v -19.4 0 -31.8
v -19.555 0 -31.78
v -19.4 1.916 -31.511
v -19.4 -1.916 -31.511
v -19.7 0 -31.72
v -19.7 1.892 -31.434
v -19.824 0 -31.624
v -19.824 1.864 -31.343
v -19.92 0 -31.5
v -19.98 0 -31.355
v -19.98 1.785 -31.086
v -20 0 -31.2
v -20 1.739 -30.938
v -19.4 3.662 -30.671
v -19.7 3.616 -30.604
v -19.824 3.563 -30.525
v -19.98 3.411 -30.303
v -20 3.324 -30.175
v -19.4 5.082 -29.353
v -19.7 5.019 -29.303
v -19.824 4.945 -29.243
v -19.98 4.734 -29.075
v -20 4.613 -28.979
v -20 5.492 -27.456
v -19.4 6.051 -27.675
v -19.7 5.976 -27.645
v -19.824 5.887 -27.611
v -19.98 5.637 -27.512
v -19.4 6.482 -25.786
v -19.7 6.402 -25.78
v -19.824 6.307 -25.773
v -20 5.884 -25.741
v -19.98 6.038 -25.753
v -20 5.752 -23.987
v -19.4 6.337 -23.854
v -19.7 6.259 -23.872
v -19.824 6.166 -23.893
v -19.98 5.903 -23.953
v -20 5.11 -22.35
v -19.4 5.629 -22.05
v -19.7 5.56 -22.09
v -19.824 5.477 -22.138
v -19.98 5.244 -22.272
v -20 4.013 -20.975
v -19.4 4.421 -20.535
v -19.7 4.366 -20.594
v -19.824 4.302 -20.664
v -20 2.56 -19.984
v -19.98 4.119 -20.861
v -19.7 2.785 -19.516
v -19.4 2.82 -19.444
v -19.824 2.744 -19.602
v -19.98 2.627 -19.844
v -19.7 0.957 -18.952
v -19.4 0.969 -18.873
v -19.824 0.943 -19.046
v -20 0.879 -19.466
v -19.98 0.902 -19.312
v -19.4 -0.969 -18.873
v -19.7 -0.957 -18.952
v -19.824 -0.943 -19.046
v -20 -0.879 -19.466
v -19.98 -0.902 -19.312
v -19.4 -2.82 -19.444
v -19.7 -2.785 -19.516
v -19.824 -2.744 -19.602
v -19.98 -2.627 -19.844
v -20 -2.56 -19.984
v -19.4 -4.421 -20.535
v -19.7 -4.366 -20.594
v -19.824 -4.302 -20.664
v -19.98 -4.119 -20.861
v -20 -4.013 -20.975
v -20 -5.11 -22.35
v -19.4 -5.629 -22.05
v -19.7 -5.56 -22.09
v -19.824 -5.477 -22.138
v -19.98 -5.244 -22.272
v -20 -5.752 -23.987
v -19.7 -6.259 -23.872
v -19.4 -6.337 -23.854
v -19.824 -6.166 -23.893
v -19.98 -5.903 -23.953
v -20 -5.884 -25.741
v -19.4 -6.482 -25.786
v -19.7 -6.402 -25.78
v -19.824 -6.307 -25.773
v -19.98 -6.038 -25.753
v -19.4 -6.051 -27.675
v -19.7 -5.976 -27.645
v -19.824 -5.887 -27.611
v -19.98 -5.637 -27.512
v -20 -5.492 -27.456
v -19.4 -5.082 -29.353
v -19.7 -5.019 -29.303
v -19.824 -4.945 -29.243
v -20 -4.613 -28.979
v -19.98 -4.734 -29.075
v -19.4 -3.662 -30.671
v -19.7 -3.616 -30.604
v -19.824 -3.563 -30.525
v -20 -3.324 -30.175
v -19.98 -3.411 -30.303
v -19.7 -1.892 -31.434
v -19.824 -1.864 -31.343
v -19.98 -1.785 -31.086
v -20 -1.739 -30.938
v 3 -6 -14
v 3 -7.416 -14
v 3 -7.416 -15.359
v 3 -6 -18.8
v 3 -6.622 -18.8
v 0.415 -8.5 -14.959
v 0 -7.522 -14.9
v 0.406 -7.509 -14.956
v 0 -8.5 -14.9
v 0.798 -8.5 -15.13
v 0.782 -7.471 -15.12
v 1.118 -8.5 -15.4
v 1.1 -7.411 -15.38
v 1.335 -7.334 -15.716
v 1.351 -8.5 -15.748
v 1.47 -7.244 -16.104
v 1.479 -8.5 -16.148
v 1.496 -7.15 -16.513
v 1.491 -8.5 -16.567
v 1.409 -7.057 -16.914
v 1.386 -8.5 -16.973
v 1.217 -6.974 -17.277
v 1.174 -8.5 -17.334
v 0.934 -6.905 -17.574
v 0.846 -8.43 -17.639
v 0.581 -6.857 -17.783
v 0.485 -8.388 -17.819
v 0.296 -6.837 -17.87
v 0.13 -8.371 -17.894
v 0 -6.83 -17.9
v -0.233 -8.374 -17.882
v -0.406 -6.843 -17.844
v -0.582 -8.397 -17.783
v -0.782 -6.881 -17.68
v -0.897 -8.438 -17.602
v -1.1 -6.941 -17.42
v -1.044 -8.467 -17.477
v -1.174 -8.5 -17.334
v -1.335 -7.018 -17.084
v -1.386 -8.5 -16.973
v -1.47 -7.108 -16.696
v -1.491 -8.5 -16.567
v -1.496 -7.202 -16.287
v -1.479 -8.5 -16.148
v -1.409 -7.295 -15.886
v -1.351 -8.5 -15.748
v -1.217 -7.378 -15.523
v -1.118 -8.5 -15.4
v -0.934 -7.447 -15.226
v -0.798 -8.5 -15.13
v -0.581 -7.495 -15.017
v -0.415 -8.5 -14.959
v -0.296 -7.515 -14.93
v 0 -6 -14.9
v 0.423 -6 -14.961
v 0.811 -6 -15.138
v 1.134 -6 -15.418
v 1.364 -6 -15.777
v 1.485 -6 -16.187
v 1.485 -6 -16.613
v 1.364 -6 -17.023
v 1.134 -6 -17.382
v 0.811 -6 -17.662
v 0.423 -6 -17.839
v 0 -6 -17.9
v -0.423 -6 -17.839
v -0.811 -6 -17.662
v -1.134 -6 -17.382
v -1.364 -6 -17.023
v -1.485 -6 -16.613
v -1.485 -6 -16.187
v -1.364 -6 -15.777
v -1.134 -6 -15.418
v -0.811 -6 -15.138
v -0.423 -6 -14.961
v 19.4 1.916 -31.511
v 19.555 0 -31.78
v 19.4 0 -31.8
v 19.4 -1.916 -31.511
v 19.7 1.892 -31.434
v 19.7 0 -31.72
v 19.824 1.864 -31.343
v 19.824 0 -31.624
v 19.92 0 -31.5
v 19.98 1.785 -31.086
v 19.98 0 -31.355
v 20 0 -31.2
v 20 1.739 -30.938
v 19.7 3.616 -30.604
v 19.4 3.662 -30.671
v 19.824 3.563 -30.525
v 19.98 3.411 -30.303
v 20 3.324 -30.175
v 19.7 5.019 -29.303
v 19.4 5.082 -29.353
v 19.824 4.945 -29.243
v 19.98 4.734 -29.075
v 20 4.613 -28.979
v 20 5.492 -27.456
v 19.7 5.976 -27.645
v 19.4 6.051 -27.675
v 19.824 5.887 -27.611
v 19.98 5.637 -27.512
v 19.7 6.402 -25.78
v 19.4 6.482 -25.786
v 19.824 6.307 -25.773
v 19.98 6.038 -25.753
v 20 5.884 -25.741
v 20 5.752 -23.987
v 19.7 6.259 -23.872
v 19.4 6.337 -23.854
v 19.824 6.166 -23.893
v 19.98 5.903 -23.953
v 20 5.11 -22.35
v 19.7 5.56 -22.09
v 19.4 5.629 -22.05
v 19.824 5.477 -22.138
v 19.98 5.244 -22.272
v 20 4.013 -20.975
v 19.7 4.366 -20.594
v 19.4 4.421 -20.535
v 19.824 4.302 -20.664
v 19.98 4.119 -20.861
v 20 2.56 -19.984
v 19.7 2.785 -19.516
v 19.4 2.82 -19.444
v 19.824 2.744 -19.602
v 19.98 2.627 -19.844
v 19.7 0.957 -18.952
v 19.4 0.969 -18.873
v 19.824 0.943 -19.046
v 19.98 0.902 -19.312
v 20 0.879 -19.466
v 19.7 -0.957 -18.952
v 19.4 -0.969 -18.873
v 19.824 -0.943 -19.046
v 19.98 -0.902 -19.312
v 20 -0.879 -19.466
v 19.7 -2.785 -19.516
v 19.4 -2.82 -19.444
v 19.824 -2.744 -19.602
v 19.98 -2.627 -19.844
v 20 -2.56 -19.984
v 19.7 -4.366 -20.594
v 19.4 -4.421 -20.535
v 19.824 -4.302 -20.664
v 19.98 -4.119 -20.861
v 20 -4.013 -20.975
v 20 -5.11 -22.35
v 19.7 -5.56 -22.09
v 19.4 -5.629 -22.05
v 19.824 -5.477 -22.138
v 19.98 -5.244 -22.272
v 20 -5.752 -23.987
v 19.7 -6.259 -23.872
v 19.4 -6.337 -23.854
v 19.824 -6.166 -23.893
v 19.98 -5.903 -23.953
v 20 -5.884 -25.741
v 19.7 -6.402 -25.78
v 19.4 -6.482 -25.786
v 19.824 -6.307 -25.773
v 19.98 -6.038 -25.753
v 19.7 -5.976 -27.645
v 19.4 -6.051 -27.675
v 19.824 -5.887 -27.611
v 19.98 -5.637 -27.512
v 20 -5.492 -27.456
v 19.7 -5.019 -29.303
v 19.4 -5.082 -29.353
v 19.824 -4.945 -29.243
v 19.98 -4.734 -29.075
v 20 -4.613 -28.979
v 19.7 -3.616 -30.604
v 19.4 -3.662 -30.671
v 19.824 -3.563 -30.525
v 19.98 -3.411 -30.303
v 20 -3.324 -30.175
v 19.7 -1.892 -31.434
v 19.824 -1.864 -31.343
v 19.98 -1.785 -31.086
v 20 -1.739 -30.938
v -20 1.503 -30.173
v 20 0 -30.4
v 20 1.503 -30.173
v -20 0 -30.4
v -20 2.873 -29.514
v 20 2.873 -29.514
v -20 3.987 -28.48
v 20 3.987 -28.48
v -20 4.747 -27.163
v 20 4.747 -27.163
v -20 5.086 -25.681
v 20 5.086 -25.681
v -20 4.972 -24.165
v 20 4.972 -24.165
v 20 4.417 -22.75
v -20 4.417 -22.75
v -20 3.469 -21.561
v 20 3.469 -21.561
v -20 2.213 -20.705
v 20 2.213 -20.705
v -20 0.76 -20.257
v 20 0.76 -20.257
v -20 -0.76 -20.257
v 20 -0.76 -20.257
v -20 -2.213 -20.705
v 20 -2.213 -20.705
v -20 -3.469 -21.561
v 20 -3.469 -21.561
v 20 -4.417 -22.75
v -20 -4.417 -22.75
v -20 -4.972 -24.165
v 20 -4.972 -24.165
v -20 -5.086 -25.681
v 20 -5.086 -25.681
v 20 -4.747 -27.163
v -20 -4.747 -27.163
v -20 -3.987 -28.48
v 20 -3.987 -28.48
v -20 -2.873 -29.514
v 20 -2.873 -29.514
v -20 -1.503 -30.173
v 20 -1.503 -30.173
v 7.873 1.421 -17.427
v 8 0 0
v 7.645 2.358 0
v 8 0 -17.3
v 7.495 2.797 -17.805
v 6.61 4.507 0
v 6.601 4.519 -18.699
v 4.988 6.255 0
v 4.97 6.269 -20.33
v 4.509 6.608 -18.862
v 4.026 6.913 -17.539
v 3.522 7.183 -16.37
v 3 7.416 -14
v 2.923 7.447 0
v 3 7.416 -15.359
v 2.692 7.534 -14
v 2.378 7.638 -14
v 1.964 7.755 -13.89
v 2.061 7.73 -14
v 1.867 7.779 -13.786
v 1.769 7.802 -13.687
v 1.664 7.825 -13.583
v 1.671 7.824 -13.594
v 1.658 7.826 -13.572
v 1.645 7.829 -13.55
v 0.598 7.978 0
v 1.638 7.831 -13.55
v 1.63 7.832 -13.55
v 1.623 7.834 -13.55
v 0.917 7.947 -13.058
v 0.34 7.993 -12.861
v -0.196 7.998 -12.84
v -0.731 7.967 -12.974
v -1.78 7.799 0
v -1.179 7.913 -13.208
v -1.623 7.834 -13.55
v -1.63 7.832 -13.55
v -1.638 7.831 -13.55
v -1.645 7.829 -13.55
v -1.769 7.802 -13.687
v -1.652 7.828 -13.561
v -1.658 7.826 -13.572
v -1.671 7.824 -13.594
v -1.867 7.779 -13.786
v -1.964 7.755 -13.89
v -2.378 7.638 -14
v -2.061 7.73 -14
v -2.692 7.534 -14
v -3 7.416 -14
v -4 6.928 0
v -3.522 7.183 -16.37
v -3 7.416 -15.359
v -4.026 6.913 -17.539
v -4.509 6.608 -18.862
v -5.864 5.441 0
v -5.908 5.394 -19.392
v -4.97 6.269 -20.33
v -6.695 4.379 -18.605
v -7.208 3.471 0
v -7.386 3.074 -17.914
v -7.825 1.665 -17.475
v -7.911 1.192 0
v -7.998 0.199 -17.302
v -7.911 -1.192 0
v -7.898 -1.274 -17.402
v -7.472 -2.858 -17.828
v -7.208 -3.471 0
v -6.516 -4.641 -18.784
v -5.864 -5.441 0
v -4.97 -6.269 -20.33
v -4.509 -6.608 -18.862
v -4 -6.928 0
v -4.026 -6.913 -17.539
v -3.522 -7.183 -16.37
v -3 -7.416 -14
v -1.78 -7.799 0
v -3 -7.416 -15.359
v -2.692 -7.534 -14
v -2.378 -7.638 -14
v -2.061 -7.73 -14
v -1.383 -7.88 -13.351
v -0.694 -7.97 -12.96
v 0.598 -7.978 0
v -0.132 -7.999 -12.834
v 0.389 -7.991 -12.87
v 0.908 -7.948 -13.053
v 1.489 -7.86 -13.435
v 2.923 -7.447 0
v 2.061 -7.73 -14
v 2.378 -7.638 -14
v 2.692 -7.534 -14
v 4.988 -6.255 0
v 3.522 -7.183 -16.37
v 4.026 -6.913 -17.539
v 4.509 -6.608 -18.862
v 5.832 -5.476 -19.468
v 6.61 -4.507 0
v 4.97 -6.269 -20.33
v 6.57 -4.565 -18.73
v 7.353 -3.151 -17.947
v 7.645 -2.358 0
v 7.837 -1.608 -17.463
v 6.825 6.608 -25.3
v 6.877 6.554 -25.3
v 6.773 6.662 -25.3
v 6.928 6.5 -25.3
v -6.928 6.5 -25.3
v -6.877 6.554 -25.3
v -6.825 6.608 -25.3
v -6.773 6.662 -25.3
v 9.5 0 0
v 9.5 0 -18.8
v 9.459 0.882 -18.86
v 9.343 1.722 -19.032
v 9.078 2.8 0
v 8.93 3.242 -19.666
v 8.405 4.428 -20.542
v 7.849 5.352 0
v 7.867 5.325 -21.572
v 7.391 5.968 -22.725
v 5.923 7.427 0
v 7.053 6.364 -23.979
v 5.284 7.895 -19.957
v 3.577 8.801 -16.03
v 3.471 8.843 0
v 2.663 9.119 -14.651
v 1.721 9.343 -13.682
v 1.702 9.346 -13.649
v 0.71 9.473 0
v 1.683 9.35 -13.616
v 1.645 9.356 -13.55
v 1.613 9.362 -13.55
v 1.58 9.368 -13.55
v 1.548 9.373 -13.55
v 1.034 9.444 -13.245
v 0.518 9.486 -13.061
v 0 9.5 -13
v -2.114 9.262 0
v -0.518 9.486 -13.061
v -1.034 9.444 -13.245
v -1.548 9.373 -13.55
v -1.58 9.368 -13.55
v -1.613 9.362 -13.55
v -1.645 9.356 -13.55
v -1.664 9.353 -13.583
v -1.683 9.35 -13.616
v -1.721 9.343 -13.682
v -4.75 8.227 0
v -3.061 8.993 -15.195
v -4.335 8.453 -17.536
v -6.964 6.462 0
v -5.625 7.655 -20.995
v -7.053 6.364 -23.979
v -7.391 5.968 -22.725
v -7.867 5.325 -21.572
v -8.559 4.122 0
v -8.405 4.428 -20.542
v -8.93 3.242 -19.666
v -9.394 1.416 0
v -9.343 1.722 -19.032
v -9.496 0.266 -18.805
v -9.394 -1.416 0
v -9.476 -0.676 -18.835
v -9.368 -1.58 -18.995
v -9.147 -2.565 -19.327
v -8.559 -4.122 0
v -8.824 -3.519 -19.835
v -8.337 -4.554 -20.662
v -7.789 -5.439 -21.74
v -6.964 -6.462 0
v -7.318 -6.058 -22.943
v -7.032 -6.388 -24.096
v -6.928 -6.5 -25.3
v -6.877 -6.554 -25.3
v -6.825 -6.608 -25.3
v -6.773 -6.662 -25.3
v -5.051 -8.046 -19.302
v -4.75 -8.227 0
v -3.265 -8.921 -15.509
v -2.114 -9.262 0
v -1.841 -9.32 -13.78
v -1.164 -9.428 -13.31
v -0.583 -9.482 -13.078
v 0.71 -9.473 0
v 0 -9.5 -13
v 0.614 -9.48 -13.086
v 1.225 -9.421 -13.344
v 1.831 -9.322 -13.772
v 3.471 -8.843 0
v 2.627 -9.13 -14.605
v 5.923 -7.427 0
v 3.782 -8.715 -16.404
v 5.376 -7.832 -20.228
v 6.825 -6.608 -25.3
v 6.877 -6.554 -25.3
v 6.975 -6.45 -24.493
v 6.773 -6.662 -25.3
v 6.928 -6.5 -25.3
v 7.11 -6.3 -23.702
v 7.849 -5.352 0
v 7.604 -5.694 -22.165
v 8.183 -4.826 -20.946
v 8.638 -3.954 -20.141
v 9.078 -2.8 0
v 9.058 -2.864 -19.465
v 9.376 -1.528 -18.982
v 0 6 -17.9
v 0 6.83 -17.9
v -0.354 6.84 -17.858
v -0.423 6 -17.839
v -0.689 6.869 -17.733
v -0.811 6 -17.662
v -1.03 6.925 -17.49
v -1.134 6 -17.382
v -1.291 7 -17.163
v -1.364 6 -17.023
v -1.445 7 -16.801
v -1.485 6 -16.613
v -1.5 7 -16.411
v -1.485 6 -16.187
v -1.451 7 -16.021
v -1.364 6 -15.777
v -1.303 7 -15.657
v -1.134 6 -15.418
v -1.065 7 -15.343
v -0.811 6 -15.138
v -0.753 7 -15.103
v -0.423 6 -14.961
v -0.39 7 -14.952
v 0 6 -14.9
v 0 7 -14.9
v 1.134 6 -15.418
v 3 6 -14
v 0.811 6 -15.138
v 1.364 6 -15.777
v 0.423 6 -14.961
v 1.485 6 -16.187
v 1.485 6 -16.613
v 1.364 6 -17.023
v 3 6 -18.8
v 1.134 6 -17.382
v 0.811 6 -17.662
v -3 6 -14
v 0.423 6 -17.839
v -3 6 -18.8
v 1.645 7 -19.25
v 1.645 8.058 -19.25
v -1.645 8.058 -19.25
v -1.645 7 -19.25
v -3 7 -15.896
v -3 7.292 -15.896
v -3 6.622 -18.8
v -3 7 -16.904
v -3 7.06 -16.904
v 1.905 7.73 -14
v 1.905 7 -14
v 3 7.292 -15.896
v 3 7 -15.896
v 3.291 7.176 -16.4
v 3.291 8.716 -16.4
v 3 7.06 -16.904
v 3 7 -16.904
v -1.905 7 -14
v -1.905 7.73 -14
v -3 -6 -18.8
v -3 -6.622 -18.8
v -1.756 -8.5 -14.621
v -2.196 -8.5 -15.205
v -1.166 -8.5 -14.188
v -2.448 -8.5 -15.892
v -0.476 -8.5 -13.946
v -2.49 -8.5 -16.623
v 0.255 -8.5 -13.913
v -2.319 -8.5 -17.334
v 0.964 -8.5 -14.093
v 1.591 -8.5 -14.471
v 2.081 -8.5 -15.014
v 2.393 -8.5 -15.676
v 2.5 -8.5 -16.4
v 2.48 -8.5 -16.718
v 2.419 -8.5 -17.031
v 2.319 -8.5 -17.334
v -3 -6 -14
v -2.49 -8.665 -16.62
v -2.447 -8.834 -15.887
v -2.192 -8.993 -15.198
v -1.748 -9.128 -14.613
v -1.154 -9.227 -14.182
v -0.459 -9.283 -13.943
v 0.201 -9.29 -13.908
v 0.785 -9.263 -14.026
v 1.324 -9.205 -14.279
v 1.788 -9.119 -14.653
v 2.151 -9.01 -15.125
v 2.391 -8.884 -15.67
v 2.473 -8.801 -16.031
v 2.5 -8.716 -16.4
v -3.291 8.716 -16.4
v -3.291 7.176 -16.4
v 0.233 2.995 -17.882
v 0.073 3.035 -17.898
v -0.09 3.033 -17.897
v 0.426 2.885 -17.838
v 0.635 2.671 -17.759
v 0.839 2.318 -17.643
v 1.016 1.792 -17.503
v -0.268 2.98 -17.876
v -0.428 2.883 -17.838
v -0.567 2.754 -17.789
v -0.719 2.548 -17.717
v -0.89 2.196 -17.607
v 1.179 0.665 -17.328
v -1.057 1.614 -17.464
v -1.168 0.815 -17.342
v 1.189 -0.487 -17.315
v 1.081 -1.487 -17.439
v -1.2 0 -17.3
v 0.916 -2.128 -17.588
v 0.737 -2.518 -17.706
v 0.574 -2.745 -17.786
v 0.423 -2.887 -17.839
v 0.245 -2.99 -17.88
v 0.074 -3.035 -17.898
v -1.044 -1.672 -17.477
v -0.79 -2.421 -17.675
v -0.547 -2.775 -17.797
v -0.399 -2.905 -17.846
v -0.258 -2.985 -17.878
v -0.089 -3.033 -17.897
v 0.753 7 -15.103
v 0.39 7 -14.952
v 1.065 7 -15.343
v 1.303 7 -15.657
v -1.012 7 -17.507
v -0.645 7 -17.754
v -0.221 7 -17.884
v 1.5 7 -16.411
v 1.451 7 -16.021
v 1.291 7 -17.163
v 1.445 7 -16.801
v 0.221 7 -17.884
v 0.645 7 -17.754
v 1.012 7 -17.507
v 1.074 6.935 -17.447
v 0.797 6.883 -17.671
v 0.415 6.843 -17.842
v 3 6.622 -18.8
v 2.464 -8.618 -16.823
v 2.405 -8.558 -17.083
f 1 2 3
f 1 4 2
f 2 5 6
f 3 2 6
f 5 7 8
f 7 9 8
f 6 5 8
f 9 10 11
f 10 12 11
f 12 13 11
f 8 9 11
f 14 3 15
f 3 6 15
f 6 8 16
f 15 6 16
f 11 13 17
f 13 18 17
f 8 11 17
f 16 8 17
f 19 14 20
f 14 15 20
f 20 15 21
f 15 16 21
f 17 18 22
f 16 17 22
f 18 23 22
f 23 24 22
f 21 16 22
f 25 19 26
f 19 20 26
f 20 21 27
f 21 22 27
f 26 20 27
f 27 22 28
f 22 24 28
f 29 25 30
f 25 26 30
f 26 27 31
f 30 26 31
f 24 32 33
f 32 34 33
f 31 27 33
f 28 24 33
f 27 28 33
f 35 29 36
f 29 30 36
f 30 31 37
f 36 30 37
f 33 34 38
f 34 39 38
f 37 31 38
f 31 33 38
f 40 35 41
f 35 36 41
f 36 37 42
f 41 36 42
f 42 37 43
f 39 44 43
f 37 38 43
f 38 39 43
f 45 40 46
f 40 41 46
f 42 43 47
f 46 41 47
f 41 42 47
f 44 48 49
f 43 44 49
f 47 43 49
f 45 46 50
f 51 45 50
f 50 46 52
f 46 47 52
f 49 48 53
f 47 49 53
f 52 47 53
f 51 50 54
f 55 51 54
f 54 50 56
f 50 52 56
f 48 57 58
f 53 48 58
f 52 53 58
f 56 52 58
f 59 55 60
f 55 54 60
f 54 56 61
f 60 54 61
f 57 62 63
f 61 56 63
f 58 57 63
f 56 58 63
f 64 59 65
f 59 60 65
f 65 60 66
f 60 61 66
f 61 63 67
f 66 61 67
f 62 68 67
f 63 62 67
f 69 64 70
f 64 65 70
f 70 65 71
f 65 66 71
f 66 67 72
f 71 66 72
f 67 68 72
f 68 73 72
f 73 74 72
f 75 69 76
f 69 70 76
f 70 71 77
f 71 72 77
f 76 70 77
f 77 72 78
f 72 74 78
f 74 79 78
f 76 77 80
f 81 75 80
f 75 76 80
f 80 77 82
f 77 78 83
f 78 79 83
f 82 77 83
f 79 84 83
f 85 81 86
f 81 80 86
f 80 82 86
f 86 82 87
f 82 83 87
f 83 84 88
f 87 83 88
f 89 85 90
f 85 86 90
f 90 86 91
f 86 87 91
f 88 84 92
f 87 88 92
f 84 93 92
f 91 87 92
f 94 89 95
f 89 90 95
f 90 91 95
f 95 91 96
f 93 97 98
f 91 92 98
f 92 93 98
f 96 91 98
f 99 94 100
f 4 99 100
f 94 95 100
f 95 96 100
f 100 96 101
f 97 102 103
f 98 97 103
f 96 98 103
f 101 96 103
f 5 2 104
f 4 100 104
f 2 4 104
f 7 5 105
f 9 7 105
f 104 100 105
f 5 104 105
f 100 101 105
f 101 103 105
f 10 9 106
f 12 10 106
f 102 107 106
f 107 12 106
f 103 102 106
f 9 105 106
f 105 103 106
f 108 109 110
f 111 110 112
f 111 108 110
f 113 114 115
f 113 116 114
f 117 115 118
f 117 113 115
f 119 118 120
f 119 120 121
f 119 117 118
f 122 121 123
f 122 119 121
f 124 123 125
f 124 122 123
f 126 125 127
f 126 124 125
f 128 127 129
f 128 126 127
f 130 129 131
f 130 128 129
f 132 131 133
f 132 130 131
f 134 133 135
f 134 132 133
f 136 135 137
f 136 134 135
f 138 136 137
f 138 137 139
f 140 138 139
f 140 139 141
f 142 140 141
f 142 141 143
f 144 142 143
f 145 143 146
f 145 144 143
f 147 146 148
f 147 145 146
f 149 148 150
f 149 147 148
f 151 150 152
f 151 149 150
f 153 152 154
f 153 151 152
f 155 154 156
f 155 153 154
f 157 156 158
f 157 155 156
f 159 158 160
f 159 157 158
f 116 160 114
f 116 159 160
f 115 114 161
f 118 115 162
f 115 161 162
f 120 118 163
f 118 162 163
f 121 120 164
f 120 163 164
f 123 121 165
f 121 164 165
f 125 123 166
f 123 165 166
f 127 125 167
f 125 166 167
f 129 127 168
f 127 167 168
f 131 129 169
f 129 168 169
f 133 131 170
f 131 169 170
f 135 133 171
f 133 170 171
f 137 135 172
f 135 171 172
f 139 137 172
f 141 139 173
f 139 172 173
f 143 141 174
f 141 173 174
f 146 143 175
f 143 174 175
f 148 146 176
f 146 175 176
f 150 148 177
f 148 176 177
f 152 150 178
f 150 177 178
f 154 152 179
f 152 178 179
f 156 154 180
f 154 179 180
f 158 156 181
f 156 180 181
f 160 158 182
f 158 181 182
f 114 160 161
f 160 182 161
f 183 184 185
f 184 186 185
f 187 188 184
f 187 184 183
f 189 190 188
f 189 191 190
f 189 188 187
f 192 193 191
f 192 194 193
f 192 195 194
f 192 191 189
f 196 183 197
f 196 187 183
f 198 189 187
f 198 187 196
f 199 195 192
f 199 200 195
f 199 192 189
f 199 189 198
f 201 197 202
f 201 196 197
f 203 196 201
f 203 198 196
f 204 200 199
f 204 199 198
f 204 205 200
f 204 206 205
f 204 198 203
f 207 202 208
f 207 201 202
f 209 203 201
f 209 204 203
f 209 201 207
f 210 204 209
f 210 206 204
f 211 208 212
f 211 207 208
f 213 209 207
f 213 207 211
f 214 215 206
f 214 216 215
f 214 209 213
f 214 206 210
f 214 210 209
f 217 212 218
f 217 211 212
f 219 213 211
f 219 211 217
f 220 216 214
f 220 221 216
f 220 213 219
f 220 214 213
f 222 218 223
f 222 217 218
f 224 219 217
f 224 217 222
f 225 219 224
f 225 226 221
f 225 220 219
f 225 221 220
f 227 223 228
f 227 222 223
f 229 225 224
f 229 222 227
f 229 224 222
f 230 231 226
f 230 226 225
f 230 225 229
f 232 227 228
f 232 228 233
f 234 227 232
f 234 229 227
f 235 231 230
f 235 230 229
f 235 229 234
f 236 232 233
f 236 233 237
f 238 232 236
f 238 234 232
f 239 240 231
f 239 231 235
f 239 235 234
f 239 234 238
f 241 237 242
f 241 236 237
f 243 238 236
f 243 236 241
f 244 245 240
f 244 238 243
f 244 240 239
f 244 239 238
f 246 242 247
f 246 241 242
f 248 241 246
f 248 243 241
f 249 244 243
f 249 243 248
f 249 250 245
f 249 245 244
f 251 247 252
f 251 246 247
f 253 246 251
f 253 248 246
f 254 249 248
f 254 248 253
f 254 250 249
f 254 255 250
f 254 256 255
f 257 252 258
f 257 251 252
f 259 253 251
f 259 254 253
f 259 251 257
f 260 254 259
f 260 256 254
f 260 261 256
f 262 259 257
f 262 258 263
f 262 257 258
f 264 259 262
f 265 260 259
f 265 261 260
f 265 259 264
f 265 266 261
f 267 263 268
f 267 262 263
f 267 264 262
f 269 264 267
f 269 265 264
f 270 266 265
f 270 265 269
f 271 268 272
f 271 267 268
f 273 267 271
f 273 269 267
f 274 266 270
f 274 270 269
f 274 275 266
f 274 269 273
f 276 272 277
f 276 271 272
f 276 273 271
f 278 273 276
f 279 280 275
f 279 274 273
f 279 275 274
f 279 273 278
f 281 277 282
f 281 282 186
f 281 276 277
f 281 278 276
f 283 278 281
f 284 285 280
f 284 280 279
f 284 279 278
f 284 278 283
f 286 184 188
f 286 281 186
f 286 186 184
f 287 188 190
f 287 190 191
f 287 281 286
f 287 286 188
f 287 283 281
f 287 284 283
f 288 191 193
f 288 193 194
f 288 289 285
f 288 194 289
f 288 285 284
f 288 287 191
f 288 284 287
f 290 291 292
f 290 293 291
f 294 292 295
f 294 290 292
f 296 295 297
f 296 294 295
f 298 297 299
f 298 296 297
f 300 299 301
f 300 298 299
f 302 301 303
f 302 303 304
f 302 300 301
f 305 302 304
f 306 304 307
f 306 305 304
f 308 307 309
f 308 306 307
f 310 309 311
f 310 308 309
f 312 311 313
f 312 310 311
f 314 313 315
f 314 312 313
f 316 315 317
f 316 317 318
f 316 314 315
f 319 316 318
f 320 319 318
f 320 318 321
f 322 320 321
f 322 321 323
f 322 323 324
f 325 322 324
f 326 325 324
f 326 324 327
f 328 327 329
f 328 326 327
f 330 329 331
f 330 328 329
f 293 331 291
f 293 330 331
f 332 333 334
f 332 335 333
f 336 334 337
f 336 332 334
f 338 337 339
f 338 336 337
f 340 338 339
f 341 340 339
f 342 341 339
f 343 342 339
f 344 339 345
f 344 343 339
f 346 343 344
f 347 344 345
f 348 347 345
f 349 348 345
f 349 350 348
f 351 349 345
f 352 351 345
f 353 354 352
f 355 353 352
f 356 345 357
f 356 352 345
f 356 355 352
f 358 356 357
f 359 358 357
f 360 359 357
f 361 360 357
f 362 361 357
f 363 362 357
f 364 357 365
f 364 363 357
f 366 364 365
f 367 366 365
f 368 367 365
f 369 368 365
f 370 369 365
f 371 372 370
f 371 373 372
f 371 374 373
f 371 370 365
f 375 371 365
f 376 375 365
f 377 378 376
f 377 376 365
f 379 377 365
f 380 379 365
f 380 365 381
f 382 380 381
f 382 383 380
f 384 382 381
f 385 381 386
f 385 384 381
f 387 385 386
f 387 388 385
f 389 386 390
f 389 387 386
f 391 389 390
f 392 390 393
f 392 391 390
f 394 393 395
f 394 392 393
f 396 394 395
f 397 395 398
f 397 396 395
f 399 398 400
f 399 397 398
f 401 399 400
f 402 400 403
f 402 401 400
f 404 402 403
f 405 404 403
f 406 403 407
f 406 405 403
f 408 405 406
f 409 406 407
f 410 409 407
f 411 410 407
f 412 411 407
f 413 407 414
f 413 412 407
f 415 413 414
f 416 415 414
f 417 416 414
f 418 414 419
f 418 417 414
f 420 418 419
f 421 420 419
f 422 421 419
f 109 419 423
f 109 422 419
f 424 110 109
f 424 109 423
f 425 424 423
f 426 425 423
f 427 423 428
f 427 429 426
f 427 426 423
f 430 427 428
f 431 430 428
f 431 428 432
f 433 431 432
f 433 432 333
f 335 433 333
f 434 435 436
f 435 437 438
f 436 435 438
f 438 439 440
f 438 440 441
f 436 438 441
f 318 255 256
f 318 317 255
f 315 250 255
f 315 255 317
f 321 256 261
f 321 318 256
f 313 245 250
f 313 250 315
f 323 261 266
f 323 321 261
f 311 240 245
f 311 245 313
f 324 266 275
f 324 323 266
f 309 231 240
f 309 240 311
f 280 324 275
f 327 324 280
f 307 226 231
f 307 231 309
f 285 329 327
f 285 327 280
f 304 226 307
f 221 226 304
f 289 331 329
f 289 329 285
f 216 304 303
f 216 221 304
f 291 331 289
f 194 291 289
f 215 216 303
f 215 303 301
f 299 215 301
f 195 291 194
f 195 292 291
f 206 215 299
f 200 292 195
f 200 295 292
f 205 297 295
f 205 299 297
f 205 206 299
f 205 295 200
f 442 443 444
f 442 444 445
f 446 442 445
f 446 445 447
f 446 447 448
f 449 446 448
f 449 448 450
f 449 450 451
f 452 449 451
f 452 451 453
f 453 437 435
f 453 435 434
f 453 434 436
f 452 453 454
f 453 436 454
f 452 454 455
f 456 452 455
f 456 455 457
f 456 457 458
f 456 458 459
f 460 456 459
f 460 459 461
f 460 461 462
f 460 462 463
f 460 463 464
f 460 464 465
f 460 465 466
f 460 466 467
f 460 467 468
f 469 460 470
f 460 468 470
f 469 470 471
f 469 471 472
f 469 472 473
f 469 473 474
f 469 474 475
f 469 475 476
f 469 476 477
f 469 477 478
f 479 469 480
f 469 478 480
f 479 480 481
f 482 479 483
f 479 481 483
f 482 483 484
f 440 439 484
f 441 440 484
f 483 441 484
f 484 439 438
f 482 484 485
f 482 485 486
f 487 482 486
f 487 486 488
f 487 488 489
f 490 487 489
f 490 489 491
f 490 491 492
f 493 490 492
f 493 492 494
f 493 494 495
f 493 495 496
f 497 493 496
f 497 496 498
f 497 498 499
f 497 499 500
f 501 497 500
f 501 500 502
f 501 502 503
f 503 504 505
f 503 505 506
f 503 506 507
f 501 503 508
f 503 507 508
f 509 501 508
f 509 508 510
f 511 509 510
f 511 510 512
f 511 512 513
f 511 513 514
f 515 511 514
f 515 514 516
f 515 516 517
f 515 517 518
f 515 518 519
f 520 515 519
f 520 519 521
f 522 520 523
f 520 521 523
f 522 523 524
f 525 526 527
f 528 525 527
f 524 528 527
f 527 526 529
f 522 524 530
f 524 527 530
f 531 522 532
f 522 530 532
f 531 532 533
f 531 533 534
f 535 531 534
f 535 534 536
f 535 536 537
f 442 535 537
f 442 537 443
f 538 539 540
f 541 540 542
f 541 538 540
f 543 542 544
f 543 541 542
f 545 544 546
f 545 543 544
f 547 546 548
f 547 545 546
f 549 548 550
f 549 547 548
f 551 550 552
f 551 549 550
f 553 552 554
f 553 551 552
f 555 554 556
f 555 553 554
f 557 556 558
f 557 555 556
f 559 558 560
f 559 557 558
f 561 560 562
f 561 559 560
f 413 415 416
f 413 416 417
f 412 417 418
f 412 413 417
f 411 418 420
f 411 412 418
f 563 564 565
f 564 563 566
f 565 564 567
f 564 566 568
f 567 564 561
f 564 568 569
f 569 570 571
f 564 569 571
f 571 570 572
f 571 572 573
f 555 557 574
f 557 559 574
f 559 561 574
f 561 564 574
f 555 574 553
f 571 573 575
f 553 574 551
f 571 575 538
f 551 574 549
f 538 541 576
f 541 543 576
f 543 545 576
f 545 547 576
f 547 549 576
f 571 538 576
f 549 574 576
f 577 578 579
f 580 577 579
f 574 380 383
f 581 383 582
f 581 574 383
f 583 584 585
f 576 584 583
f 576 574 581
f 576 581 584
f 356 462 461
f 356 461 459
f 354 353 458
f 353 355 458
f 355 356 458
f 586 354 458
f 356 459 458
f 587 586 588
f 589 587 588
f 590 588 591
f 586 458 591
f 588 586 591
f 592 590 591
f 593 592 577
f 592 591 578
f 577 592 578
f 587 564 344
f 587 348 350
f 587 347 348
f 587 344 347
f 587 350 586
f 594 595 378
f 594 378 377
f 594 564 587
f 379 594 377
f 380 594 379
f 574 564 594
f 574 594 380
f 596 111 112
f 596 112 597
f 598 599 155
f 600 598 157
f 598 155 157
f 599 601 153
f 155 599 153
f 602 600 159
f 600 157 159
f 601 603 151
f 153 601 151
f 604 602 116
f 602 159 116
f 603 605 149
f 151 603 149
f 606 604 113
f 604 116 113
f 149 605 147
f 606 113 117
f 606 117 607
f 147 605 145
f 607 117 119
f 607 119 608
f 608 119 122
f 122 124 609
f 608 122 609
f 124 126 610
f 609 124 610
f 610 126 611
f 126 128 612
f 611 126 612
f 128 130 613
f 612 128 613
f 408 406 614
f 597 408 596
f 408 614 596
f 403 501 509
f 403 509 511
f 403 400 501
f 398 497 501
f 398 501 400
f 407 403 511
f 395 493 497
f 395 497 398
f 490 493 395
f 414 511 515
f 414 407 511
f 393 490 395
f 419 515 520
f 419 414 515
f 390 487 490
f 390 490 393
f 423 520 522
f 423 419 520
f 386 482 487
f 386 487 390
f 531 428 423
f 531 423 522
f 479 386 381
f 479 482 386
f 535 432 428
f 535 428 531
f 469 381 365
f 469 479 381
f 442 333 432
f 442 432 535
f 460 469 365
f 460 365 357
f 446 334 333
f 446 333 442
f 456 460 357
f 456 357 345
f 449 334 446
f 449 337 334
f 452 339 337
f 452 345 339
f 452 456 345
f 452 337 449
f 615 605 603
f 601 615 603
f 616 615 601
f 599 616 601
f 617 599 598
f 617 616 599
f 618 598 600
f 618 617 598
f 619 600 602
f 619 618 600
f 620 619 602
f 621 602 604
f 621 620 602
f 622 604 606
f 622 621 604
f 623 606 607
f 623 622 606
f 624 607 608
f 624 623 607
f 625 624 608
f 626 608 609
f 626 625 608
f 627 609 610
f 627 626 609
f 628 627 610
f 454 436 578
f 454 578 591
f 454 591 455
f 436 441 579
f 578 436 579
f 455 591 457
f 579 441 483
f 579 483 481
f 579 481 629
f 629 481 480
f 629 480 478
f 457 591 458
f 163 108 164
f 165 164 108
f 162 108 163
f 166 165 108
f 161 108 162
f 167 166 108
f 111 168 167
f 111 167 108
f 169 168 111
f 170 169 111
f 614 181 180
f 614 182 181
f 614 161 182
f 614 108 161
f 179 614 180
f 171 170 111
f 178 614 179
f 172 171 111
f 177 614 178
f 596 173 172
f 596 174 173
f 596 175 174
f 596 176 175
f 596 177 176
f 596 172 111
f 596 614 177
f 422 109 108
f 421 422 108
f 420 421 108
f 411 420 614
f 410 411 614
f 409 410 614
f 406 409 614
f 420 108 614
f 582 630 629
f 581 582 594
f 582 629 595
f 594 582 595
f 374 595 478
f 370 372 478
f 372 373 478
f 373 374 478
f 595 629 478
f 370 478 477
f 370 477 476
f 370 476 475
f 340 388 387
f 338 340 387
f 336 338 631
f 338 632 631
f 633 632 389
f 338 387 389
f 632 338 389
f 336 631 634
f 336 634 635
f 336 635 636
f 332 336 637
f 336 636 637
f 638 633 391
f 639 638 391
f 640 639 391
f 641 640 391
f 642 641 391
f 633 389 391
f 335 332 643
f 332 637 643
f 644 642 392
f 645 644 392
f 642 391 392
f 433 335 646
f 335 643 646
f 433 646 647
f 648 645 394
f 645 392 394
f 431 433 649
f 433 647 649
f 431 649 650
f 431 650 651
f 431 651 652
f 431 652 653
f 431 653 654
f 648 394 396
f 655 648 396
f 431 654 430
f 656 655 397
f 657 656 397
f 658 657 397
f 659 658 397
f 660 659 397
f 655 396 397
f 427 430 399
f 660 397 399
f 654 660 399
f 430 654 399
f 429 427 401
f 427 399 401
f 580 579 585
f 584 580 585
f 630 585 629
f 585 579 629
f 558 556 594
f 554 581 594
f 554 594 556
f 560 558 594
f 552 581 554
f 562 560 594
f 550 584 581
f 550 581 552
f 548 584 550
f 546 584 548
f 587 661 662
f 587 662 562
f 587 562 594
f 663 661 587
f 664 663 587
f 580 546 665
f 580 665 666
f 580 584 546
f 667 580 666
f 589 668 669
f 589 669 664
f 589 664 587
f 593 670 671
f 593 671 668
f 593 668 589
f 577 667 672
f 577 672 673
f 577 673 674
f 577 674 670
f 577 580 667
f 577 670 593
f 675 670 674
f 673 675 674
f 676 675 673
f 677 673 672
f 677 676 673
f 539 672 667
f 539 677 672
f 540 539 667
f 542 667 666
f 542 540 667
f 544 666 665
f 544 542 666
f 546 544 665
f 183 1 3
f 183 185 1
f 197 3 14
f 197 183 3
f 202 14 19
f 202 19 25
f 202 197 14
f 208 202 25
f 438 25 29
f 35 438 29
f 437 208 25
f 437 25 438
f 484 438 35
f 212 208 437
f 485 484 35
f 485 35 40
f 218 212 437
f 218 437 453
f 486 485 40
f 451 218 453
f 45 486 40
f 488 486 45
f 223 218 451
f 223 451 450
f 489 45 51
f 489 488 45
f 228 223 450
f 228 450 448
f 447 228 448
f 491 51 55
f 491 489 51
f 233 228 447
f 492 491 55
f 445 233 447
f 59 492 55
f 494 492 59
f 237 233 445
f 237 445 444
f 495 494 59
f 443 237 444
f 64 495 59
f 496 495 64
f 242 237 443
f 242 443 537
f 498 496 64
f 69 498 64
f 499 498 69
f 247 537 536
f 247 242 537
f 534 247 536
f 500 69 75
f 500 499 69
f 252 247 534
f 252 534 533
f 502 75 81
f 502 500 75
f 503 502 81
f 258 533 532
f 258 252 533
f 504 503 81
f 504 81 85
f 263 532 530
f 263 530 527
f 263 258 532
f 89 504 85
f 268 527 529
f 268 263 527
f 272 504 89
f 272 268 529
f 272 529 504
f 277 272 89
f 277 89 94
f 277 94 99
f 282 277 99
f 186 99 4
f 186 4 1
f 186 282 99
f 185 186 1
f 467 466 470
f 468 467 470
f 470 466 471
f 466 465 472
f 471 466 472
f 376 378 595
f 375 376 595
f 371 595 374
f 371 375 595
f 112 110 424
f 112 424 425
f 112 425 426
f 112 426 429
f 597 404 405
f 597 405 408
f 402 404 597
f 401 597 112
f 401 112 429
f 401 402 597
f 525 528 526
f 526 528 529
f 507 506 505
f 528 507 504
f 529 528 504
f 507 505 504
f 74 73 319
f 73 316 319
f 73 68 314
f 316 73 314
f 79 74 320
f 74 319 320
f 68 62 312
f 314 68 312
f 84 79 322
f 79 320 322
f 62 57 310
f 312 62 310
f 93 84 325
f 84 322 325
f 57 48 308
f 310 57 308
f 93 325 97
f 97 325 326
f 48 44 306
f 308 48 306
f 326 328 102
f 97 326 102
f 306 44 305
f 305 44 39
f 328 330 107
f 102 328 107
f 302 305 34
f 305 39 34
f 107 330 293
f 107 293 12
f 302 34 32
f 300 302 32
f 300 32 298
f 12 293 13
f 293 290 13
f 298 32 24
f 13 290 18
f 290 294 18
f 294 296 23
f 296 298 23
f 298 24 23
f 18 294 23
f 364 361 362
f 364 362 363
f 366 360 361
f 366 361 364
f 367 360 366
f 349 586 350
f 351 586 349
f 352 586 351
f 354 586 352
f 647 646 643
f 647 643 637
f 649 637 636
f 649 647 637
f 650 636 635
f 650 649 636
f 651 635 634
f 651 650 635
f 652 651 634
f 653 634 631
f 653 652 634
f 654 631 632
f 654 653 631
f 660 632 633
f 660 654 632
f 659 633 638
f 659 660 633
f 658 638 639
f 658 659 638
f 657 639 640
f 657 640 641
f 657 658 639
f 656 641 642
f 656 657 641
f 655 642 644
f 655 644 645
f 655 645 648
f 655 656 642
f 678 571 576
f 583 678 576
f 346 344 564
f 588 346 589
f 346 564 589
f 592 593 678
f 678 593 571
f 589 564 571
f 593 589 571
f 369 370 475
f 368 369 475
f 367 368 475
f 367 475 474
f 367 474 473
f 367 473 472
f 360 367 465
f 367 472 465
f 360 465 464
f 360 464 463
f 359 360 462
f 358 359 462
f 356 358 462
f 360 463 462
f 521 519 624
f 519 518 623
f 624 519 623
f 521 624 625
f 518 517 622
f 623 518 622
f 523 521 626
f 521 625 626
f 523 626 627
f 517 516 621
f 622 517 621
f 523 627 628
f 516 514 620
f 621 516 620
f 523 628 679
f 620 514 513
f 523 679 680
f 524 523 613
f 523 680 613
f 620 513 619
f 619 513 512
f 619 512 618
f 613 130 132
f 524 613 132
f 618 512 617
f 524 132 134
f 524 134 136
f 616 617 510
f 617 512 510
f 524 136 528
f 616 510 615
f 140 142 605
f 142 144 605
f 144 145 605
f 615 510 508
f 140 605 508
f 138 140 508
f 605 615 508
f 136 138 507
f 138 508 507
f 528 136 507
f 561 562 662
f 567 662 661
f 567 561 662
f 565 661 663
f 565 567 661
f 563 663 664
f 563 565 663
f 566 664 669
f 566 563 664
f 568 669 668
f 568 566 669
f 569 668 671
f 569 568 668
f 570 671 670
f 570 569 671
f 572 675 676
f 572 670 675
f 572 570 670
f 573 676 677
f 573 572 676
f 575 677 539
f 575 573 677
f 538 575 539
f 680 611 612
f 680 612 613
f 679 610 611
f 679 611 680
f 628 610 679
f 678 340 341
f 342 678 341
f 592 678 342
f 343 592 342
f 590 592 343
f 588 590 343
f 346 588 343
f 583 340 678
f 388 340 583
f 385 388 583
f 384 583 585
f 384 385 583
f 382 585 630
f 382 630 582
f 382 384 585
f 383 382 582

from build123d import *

# Parameters (mm, degrees)
SKETCH_3_R               = 6.5
SKETCH_3_R_2             = 5.1
EXTRUDE_1_DEPTH          = 20
EXTRUDE_START            = -18.7999999
EXTRUDE_2_OUTLINE_R      = 9.5
EXTRUDE_2_DEPTH          = 18.7999999
EXTRUDE_START_2          = -31.801
EXTRUDE_2_2_OUTLINE_R    = 9.5
EXTRUDE_2_2_DEPTH        = 0.0009999
EXTRUDE_START_3          = -31.8000001
EXTRUDE_2_3_OUTLINE_R    = 9.5
EXTRUDE_2_3_DEPTH        = 13.0000002
EXTRUDE_START_4          = -9.5000001
EXTRUDE_2_4_OUTLINE_R    = 6.5
EXTRUDE_2_4_DEPTH        = 19.5000001
CUT_EXTRUDE_1_DEPTH      = 39.749885281
CUT_EXTRUDE_1_DEPTH_BACK = 39.749885281
CUT_EXTRUDE_2_DEPTH      = 39.749064529
CUT_EXTRUDE_2_DEPTH_BACK = 39.749064529
SHELL_1_T                = -1.5
FILLET_1_R               = 0.6
EXTRUDE_START_5          = 6
SKETCH_6_W               = 4.8
SKETCH_6_H               = 6
SKETCH_6_R               = 1.5
EXTRUDE_3_DEPTH          = 1.729857
CUT_EXTRUDE_3_DEPTH      = 39.749064611
CUT_EXTRUDE_3_DEPTH_BACK = 39.749064611
SKETCH_6_2_R             = 1.5
CUT_EXTRUDE_START        = 9.5
CUT_EXTRUDE_4_DEPTH      = 2.5
CUT_EXTRUDE_START_2      = -9.5
SKETCH_8_R               = 2.5
CUT_EXTRUDE_5_DEPTH      = 1


with BuildPart() as part:
    # 草圖3 → 填料-伸長1 (new, symmetric)
    with BuildSketch(Plane(origin=(0, 0, 0), x_dir=(0, 0, -1), z_dir=(1, 0, 0))):
        with Locations((25.3, 0)):
            Circle(SKETCH_3_R)
        with Locations((25.3, 0)):
            Circle(SKETCH_3_R_2, mode=Mode.SUBTRACT)
    extrude(amount=EXTRUDE_1_DEPTH, both=True)

    # 圓角1
    fillet_1_edges = [part.edges().sort_by_distance(p)[0] for p in [
        (-20, 0, -18.8),
        (20, 0, -18.8),
    ]]
    fillet(fillet_1_edges, radius=FILLET_1_R)



with BuildPart() as body_2:
    # 填料-伸長2: read off the stored shape, not the designer's step
    # 填料-伸長2 outline → 填料-伸長2 (new body)
    with BuildSketch(Plane.XY.offset(EXTRUDE_START)):
        Circle(EXTRUDE_2_OUTLINE_R)
    extrude(amount=EXTRUDE_2_DEPTH)

    # Extrude 2 2 outline → Extrude 2 2 (add)
    with BuildSketch(Plane.XY.offset(EXTRUDE_START_2)):
        Circle(EXTRUDE_2_2_OUTLINE_R)
    extrude(amount=EXTRUDE_2_2_DEPTH)

    # Extrude 2 3 outline → Extrude 2 3 (add)
    with BuildSketch(Plane.XY.offset(EXTRUDE_START_3)):
        Circle(EXTRUDE_2_3_OUTLINE_R)
    extrude(amount=EXTRUDE_2_3_DEPTH)

    # Extrude 2 4 outline → Extrude 2 4 (cut)
    with BuildSketch(Plane.YZ.offset(EXTRUDE_START_4)):
        with Locations((0, -25.3)):
            Circle(EXTRUDE_2_4_OUTLINE_R)
    extrude(amount=EXTRUDE_2_4_DEPTH, mode=Mode.SUBTRACT)

    # 草圖4 → 除料-伸長1 (cut, two sides: drawn at the far end of the back side and taken through both)
    with BuildSketch(Plane(origin=(0, 0, 0), x_dir=(0, 0, -1), z_dir=(1, 0, 0)).offset(-CUT_EXTRUDE_1_DEPTH_BACK)):
        with BuildLine():
            Line((25.3, -12.675131419), (25.3, -6.5))
            ThreePointArc((25.3, -6.5), (31.8, 0), (25.3, 6.5))
            Line((25.3, 6.5), (25.3, 12.675131419))
            ThreePointArc((25.3, 12.675131419), (37.975131419, 0), (25.3, -12.675131419))
        make_face()
    extrude(amount=CUT_EXTRUDE_1_DEPTH + CUT_EXTRUDE_1_DEPTH_BACK, mode=Mode.SUBTRACT)

    # 草圖5 → 除料-伸長2 (cut, two sides: drawn at the far end of the back side and taken through both)
    with BuildSketch(Plane(origin=(0, 0, 0), x_dir=(0, 0, -1), z_dir=(1, 0, 0)).offset(-CUT_EXTRUDE_2_DEPTH_BACK)):
        Polygon((26.434429002, 6.400239905), (13, 9.5), (13, 10.602524511), (26.434429002, 10.602524511), align=None)
        Polygon((13, -10.602524511), (13, -9.5), (26.434429002, -6.400239905), (26.434429002, -10.602524511), align=None)
    extrude(amount=CUT_EXTRUDE_2_DEPTH + CUT_EXTRUDE_2_DEPTH_BACK, mode=Mode.SUBTRACT)

    # 薄殼1
    shell_1_openings = [body_2.faces().sort_by_distance(p)[0] for p in [
        (0, 0, 0),
    ]]
    offset(amount=SHELL_1_T, openings=shell_1_openings)


with BuildPart() as part_1:
    add(part.part)

    add(body_2.part)  # 填料-伸長3 merges body 2
    # 草圖6 → 填料-伸長3 (add)
    with BuildSketch(Plane(origin=(0, 0, 0), x_dir=(0, 0, -1), z_dir=(0, 1, 0)).offset(EXTRUDE_START_5)):
        with Locations((16.4, 0)):
            Rectangle(SKETCH_6_W, SKETCH_6_H)
        with Locations((16.4, 0)):
            Circle(SKETCH_6_R, mode=Mode.SUBTRACT)
    extrude_3 = extrude(amount=EXTRUDE_3_DEPTH)

    # 鏡射1: 填料-伸長3 across plane
    add(extrude_3.mirror(Plane.ZX))

    # 草圖6<2> → 除料-伸長3 (cut, two sides: drawn at the far end of the back side and taken through both)
    with BuildSketch(Plane(origin=(0, 0, 0), x_dir=(0, 0, -1), z_dir=(0, 1, 0)).offset(-CUT_EXTRUDE_3_DEPTH_BACK)):
        with Locations(Location((16.4, 0, 0), (0, 0, 180))):
            Circle(SKETCH_6_2_R)
    extrude(amount=CUT_EXTRUDE_3_DEPTH + CUT_EXTRUDE_3_DEPTH_BACK, mode=Mode.SUBTRACT)

    # 草圖7 → 除料-伸長4 (cut)
    with BuildSketch(Plane(origin=(0, 0, 0), x_dir=(1, 0, 0), z_dir=(0, 1, 0)).offset(CUT_EXTRUDE_START)):
        Polygon((3.290896534, 16.4), (1.645448267, 19.25), (-1.645448267, 19.25), (-3.290896534, 16.4), (-1.645448267, 13.55), (1.645448267, 13.55), align=None)
    extrude(amount=-CUT_EXTRUDE_4_DEPTH, mode=Mode.SUBTRACT)

    # 草圖8 → 除料-伸長5 (cut)
    with BuildSketch(Plane(origin=(0, 0, 0), x_dir=(1, 0, 0), z_dir=(0, 1, 0)).offset(CUT_EXTRUDE_START_2)):
        with Locations((0, 16.4)):
            Circle(SKETCH_8_R)
    extrude(amount=CUT_EXTRUDE_5_DEPTH, mode=Mode.SUBTRACT)


solid = part_1.part
